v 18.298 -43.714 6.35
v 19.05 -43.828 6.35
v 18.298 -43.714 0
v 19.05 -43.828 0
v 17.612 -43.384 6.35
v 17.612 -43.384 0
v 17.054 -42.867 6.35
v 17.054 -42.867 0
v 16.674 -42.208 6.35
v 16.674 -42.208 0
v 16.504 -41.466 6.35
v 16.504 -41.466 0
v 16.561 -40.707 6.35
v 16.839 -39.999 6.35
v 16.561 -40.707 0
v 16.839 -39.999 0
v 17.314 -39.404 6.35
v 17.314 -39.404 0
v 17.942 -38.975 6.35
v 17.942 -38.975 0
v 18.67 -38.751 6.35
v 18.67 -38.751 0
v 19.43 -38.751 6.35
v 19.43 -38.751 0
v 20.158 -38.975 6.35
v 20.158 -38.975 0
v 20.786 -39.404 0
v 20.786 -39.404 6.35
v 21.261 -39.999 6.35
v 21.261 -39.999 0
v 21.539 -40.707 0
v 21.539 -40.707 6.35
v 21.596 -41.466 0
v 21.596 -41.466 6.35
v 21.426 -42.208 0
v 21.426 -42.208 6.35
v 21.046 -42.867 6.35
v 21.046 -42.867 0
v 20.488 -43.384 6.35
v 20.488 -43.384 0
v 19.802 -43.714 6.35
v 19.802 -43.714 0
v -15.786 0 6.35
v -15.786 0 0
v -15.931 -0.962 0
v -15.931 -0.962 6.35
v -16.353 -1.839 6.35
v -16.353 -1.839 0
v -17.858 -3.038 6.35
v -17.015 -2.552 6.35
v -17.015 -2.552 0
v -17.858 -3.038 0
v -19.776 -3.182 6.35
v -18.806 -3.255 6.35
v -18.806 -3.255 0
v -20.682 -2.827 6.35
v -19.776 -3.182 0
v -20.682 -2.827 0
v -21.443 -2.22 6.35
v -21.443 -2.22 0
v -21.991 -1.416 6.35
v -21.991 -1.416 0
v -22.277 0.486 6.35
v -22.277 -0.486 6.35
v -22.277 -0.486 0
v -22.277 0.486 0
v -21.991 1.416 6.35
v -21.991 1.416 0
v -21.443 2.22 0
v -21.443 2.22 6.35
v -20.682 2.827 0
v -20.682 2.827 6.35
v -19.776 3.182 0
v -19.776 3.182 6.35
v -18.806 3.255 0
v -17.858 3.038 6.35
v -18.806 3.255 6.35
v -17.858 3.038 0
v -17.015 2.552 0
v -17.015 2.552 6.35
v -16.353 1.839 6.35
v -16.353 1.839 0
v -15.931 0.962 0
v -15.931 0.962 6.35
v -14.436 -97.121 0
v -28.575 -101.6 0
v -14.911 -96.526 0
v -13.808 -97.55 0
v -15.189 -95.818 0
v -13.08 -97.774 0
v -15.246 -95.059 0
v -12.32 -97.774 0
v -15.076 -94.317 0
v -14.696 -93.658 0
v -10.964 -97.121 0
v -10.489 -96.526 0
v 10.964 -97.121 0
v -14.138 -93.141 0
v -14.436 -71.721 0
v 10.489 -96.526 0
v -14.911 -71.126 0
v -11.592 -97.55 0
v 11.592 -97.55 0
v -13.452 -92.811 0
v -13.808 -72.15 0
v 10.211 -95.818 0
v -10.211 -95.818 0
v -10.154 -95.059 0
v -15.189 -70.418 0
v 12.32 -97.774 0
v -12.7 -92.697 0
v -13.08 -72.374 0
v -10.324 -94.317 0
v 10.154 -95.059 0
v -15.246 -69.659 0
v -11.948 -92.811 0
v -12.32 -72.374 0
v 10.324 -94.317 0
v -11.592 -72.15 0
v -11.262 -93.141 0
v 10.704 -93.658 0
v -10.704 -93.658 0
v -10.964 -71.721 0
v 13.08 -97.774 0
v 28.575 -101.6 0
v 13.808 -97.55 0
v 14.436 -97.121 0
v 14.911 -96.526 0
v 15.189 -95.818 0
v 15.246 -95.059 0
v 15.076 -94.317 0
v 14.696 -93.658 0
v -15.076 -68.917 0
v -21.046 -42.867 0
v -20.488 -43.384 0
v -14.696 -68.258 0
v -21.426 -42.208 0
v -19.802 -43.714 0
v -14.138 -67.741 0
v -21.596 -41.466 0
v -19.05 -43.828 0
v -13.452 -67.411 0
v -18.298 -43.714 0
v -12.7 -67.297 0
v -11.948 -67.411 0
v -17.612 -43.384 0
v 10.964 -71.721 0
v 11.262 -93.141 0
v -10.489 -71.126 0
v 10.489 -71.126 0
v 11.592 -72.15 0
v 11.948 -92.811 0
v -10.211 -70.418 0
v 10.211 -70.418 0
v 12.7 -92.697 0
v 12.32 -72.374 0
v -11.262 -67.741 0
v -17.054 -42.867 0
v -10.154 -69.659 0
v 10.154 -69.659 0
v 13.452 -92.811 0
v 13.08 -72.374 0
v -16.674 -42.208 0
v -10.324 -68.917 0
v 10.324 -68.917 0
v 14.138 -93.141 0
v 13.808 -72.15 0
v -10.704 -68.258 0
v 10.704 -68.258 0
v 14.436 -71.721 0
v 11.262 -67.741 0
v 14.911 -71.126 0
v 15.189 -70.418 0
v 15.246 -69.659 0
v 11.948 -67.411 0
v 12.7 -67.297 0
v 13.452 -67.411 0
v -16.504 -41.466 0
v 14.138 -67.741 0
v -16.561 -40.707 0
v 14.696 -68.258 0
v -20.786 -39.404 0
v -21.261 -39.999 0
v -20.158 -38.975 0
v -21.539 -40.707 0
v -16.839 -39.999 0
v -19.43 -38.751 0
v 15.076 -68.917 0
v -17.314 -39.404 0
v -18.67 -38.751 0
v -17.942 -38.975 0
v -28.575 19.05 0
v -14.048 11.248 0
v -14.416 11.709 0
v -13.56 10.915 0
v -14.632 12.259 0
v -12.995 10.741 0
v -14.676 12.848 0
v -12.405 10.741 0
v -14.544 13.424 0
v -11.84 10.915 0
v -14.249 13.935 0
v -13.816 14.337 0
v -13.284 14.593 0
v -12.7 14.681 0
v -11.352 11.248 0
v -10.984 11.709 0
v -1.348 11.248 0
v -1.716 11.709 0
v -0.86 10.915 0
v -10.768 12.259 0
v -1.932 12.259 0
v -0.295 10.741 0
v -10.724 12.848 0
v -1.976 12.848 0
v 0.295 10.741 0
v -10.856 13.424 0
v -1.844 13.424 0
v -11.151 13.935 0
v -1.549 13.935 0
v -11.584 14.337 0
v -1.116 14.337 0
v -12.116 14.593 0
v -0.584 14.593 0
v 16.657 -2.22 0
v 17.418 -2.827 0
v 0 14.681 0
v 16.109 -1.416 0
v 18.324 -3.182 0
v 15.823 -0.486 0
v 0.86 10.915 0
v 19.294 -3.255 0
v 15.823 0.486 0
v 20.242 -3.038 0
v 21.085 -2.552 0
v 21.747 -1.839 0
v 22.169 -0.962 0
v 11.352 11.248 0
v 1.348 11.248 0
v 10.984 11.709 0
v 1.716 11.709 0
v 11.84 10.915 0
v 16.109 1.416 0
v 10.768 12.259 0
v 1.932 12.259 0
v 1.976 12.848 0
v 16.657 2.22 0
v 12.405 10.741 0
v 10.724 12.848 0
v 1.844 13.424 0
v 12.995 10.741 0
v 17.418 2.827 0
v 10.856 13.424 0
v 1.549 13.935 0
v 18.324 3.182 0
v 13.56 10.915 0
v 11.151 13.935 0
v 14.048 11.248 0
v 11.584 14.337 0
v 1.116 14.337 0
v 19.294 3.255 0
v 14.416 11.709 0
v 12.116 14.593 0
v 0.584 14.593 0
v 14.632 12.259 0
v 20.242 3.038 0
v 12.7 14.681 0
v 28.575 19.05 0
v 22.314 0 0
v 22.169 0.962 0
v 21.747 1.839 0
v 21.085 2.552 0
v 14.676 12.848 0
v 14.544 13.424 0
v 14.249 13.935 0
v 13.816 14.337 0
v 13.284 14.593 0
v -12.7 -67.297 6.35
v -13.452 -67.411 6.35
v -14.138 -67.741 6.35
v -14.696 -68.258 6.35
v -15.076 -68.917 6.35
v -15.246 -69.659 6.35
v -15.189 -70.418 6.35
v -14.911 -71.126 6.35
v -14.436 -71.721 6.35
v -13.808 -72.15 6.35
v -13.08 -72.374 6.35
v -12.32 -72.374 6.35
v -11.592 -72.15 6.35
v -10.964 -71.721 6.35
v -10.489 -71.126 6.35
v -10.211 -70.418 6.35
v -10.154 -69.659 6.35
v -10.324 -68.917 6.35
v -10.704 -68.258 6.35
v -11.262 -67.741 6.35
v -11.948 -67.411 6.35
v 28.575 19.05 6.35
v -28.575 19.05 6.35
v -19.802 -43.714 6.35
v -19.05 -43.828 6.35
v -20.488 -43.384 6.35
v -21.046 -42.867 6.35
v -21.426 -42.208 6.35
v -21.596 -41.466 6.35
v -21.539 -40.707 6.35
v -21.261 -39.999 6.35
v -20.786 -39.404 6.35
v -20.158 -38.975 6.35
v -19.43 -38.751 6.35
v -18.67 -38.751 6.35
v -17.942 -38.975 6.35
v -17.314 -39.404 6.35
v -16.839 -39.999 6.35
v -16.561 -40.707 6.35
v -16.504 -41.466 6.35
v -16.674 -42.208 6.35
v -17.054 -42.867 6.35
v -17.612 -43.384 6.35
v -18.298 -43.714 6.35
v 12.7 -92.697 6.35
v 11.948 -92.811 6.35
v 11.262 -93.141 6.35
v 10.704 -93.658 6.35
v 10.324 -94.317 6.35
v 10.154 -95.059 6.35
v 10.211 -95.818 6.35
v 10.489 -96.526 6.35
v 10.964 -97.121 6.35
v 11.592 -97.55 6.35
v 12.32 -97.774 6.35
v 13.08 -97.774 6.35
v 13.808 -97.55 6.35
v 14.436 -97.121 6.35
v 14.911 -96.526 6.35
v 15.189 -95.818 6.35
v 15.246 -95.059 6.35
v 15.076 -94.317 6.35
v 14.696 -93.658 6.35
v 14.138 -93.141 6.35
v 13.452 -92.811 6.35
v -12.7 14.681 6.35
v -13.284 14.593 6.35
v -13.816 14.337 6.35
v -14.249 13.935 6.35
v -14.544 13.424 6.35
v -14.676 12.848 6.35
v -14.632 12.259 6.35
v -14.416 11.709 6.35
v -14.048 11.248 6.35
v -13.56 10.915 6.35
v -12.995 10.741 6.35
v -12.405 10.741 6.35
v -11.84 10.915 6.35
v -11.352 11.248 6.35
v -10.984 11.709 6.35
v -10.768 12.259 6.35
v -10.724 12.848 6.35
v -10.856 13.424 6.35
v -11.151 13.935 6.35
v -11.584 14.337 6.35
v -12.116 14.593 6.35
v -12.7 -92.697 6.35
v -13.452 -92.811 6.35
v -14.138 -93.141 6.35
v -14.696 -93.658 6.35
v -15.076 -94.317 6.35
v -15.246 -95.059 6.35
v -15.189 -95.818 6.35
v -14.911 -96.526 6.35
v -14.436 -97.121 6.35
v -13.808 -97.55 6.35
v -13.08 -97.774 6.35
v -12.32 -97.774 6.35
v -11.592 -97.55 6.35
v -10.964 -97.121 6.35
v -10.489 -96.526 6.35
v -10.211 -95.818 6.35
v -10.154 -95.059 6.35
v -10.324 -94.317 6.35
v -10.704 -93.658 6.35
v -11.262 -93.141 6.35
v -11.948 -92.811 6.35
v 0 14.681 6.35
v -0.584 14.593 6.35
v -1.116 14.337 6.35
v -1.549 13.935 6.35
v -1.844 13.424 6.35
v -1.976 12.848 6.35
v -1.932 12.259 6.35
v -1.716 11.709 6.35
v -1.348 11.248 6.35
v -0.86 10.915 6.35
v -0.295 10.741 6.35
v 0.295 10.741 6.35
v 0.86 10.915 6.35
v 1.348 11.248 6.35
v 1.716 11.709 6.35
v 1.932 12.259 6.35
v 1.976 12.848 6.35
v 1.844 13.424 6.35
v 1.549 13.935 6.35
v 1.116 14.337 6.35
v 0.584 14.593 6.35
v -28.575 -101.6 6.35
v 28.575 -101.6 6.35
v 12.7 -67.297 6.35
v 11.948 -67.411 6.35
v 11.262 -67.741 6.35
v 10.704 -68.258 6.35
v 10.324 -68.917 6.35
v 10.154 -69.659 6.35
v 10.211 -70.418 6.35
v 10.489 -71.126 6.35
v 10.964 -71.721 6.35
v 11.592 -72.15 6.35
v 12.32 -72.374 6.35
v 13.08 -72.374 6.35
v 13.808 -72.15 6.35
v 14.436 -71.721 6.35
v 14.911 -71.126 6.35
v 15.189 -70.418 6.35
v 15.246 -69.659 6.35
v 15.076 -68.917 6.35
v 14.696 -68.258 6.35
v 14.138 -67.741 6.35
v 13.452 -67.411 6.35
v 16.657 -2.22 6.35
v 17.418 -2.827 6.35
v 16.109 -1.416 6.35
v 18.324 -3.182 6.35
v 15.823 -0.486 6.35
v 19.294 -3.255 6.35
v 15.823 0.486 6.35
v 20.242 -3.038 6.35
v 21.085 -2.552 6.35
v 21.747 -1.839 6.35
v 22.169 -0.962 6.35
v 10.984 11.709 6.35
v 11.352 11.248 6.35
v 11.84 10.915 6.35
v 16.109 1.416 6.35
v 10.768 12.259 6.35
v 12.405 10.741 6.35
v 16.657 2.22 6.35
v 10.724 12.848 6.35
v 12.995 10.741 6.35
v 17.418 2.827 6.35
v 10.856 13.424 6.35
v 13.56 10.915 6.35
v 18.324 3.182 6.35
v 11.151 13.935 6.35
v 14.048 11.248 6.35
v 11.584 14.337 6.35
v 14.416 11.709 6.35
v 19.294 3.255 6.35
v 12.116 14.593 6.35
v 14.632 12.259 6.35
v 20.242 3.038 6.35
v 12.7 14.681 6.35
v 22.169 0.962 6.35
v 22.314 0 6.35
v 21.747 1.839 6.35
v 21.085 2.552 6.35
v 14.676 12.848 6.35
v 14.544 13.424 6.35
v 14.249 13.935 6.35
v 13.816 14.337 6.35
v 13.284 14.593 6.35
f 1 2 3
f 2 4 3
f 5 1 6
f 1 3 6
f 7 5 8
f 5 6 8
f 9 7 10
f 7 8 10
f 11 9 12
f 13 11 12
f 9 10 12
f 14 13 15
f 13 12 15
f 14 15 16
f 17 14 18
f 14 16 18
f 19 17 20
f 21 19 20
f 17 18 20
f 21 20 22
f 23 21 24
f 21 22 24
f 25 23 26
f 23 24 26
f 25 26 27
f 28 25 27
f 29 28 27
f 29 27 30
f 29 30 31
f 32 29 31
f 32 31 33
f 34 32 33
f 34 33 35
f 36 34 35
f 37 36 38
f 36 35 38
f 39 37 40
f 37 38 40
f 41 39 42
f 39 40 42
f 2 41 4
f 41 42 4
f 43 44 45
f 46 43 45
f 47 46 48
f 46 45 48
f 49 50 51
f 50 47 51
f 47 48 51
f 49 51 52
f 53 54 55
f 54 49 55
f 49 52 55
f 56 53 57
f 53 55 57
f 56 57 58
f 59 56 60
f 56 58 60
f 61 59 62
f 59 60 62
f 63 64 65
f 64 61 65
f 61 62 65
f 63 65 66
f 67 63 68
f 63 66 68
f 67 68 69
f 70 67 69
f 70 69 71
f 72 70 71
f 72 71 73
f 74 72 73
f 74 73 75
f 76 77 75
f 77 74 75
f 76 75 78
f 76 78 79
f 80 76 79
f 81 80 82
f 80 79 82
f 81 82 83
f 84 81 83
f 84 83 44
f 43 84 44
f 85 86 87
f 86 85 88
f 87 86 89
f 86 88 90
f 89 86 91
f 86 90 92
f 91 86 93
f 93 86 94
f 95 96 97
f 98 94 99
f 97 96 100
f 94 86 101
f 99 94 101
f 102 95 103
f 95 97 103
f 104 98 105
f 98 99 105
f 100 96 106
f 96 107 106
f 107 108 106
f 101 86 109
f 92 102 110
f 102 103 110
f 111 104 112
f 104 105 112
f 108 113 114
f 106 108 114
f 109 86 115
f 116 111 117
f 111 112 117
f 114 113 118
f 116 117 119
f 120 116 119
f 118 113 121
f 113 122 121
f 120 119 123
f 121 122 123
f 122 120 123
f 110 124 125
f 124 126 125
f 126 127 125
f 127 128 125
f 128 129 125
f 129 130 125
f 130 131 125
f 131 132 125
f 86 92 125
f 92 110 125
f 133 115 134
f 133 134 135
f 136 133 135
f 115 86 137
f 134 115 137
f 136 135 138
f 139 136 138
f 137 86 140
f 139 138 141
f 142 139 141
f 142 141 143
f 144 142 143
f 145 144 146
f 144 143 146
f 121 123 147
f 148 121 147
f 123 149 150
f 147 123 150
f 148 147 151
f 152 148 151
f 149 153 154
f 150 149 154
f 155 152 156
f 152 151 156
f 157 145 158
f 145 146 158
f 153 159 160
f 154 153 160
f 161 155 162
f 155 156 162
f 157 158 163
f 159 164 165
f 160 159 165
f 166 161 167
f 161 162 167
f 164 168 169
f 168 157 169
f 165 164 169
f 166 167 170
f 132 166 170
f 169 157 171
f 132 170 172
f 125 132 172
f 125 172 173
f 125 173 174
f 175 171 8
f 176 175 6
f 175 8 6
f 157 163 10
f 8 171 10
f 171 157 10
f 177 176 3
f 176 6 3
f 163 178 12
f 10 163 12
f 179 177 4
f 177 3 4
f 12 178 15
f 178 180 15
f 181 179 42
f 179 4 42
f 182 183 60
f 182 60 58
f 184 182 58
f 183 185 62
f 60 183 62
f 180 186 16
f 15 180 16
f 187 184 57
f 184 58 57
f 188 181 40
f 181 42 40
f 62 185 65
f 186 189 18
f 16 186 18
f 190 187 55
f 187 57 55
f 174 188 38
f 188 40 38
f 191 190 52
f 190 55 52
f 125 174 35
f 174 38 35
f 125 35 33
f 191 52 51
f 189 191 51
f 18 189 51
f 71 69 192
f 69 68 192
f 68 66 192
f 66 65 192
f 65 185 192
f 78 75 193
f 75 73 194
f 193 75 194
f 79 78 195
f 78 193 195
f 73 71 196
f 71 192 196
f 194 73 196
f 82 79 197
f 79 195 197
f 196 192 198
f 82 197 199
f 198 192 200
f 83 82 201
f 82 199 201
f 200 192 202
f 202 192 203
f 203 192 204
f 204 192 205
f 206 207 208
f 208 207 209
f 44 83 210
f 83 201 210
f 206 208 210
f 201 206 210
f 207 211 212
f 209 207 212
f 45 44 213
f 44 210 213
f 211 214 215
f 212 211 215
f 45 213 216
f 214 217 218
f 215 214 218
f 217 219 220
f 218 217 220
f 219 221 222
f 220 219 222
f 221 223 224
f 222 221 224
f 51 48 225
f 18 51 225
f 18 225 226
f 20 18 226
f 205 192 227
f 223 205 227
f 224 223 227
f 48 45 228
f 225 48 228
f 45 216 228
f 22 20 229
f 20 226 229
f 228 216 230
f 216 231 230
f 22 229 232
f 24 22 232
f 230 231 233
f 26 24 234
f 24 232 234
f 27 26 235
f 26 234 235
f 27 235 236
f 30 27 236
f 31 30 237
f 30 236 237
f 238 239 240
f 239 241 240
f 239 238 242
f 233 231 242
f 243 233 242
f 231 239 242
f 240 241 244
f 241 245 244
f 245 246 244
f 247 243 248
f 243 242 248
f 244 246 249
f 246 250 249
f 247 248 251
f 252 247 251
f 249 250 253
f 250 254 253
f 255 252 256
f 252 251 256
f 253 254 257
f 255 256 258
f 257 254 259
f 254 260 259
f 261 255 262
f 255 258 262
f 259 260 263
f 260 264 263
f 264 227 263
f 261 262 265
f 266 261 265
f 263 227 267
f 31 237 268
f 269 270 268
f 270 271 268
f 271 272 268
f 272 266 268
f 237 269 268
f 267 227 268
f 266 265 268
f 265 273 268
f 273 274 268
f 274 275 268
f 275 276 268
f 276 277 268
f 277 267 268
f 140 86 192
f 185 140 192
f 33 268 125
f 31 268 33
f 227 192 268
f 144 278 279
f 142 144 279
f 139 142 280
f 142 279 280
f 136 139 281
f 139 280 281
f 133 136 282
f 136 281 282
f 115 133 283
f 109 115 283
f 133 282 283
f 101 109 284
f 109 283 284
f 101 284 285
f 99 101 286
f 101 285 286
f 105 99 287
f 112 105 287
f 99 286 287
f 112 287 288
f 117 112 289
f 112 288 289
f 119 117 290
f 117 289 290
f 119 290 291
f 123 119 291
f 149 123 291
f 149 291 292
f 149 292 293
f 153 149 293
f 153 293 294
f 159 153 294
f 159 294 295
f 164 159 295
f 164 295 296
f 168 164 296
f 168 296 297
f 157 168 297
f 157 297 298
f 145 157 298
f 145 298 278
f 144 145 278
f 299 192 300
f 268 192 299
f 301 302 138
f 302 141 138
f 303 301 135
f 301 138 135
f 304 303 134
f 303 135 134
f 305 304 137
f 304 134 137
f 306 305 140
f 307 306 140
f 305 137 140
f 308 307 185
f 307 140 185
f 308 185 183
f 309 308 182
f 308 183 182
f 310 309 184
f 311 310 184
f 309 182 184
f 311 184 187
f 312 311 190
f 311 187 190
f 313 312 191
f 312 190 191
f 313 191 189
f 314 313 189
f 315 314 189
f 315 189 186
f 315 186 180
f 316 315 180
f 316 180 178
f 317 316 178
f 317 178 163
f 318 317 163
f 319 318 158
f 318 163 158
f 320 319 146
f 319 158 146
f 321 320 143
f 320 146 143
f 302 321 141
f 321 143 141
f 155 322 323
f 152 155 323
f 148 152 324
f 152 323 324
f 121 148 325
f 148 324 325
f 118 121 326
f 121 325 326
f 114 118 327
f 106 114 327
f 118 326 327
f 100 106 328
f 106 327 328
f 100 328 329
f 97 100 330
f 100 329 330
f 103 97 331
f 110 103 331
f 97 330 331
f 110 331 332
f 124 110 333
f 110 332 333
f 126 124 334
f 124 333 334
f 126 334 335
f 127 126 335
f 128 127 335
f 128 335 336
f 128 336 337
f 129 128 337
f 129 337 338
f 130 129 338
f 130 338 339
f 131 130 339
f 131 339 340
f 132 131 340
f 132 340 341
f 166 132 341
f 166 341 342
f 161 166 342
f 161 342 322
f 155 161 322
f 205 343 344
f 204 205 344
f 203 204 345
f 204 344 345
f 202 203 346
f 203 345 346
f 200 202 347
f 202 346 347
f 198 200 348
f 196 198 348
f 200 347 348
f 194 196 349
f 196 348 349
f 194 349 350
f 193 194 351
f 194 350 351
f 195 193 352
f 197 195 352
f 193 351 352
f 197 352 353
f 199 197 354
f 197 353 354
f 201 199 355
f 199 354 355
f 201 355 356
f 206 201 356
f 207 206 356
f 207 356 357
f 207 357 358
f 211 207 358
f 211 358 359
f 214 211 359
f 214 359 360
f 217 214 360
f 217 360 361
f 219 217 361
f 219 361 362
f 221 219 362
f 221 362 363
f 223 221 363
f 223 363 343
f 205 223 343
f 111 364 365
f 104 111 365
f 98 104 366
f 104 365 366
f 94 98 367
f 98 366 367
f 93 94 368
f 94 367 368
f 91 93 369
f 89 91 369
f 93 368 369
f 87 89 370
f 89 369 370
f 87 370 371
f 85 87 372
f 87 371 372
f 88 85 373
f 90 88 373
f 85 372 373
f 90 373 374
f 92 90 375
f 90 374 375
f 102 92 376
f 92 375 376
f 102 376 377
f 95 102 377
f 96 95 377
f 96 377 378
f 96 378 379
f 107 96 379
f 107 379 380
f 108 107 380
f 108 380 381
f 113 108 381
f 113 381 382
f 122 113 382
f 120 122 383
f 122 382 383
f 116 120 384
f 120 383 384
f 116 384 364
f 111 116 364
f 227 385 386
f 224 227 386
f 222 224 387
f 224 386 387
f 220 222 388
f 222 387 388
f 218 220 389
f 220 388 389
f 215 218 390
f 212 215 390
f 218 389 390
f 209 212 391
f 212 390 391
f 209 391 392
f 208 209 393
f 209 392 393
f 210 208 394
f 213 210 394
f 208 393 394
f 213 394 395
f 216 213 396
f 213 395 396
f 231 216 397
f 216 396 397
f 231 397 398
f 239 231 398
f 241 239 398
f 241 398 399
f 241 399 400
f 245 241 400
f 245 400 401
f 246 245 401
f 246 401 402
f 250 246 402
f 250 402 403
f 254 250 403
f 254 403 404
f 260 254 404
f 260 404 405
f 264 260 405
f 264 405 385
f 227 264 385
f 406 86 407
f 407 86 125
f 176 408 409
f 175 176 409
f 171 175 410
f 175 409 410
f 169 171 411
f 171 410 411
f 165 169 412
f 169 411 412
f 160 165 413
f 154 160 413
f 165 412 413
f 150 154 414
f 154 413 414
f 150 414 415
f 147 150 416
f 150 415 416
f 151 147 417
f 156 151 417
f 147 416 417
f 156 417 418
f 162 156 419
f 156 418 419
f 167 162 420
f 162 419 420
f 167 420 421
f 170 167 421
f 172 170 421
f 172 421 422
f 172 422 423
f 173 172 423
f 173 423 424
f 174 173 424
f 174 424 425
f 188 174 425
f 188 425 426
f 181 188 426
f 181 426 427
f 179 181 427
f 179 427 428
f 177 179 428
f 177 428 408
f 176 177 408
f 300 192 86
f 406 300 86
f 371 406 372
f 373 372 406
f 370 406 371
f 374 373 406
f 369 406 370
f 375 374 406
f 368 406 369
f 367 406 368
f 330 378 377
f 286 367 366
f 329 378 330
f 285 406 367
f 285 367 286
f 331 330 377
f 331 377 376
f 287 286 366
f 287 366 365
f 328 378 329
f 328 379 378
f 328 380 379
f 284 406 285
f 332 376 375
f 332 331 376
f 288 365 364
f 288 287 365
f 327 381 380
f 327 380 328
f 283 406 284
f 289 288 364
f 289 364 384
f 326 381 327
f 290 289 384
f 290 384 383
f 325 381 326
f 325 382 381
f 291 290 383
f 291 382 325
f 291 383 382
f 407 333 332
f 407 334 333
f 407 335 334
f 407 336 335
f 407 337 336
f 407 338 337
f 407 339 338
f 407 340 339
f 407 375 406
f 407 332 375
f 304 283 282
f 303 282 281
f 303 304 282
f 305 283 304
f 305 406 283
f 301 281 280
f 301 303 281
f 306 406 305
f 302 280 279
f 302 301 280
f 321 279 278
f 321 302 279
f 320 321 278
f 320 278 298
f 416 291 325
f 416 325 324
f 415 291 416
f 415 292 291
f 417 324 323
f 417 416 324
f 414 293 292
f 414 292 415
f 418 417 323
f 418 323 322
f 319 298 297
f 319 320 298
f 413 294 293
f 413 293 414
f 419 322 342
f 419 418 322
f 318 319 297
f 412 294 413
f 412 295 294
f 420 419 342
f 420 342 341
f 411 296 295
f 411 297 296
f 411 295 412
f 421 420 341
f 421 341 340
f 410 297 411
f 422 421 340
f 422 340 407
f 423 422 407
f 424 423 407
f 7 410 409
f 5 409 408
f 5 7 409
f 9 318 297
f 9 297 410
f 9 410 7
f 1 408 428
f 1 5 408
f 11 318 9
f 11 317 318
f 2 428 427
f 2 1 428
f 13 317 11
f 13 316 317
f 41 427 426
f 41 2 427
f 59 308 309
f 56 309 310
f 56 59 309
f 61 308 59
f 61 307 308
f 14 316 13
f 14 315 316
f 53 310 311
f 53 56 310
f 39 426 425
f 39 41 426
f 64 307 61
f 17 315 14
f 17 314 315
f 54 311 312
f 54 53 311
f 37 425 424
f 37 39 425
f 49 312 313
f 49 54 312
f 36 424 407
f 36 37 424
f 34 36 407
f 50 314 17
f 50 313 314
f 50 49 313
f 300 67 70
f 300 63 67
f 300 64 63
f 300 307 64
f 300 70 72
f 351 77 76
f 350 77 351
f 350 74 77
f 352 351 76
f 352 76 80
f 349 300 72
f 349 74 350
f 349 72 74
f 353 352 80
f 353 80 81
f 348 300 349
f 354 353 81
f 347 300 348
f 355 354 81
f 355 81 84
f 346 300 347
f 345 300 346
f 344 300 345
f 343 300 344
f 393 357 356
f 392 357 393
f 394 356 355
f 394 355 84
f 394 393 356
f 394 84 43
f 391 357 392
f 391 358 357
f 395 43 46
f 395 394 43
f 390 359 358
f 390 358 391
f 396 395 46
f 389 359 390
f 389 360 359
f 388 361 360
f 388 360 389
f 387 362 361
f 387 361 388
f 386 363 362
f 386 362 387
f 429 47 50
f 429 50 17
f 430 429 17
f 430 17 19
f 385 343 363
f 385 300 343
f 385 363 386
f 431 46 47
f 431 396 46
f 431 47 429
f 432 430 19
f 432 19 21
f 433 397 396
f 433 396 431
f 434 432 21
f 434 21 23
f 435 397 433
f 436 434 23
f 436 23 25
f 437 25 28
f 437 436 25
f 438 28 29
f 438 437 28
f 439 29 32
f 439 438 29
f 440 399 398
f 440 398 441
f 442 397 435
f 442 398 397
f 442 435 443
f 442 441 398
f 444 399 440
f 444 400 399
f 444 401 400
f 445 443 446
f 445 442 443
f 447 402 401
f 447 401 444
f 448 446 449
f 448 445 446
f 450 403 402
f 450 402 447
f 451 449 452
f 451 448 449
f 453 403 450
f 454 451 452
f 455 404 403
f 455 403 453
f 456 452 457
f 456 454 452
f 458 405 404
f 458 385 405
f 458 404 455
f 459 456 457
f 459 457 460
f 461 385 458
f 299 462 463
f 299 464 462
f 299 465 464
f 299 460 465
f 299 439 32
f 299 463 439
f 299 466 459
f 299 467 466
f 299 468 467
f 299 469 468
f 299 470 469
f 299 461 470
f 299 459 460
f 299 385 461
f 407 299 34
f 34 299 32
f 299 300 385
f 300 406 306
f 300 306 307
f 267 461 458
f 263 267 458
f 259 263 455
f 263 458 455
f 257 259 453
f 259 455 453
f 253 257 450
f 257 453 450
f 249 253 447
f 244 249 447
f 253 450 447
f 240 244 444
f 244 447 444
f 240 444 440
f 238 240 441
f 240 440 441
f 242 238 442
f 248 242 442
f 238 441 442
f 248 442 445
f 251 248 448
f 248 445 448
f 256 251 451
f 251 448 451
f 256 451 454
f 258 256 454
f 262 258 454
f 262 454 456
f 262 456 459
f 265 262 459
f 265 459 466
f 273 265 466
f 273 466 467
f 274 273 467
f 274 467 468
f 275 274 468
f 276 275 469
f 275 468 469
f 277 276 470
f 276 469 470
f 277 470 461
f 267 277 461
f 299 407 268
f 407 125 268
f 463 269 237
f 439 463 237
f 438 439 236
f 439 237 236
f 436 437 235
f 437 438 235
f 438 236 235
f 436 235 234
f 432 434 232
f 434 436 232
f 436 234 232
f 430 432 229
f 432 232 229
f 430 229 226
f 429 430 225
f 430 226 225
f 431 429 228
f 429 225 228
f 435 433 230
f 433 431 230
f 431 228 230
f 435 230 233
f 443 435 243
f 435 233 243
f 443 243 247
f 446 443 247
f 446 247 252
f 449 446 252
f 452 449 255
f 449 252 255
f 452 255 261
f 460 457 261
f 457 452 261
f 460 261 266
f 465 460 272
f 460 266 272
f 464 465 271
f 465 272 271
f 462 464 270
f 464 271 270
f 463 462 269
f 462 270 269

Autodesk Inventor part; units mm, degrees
ref_plane "YZ Plane" through (0, 0, 0) normal (1, 0, 0) x (0, 1, 0)
ref_plane "XZ Plane" through (0, 0, 0) normal (0, 1, 0) x (-1, 0, 0)
ref_plane "XY Plane" through (0, 0, 0) normal (0, 0, 1) x (1, 0, 0)
sketch "Sketch1" plane through (0, 0, 0) normal (0, 0, 1) x (1, 0, 0)
  line L0 (-19.05, 0) -> (19.05, 0) construction
  circle A0 centre (-19.05, 0) radius 3.2639
  circle A1 centre (19.05, 0) radius 3.2639
  line L1 (-28.575, 19.5947) -> (-28.575, -101.6)
  line L2 (-28.575, -101.6) -> (28.575, -101.6)
  line L3 (28.575, -101.6) -> (28.575, 19.5947)
  line L4 (-26.7151, 24.0849) -> (-4.4901, 46.3099)
  line L5 (4.4901, 46.3099) -> (26.7151, 24.0849)
  arc A2 (4.4901, 46.3099) -> (-4.4901, 46.3099) centre (0, 41.8197) ccw
  arc A3 (-26.7151, 24.0849) -> (-28.575, 19.5947) centre (-22.225, 19.5947) ccw
  arc A4 (28.575, 19.5947) -> (26.7151, 24.0849) centre (22.225, 19.5947) ccw
  line L6 (-28.575, 19.05) -> (28.575, 19.05)
  line L7 (-12.7, 12.7) -> (12.7, 12.7) construction
  line L8 (-12.7, -69.85) -> (12.7, -69.85) construction
  point P0 (0, 0)
  point P1 (0, 0)
  point P2 (0, 50.8)
  point P3 (28.575, 22.225)
  point P4 (-28.575, 22.225)
  point P5 (0, -101.6)
  point P6 (0, 12.7)
  point P7 (0, 12.7)
  point P8 (-12.7, -95.25)
  point P9 (12.7, -95.25)
  point P10 (0, -69.85)
  dimension "d0" = 6.5278
  dimension "d1" = 38.1
  dimension "d4" = 101.6
  dimension "d17" = 152.4
  dimension "d18" = 57.15
  dimension "d19" = 6.35
  dimension "d20" = 120.65
  dimension "d21" = 25.4
  dimension "d29" = 6.35
  dimension "d32" = 25.4
  dimension "d33" = 25.4
  dimension "d34" = 6.35
  dimension "d42" = 12.7
  dimension "d43" = 19.05
extrude "Extrusion1" add sketch "Sketch1" along normal blind 6.35 contours L6 L3 L2 L1
sketch "Sketch2" plane through (0, 0, 6.35) normal (0, 0, 1) x (1, 0, 0)
  line L0 (-19.05, -41.275) -> (19.05, -41.275) construction
  line L1 (-28.575, -101.6) -> (28.575, -101.6) projected
  point P0 (0, 0)
  point P1 (0, -41.275)
  dimension "d8" = 38.1
  dimension "d9" = 60.325
hole "Hole1" at (-19.05, -41.275, 6.35) at (19.05, -41.275, 6.35) direction (0, 0, -1) diameter 5.1054 end through all clearance for "Flat Head Machine Screw (82)" size "#10" standard "Ansi Unified Screw Threads"
hole "Hole2" at (-12.7, 12.7, 0) at (0, 12.7, 0) at (12.7, 12.7, 0) direction (0, 0, 1) diameter 3.9624 end through all thread size "10-32 UNF" class "2B" standard "ANSI Unified Screw Threads"
hole "Hole3" at (-12.7, -69.85, 0) at (12.7, -69.85, 0) at (-12.7, -95.25, 0) at (12.7, -95.25, 0) direction (0, 0, 1) diameter 5.1054 end through all clearance for "Flat Head Machine Screw (82)" size "#10" standard "Ansi Unified Screw Threads"
properties part number "CL7-005" material "Aluminum 6061"
